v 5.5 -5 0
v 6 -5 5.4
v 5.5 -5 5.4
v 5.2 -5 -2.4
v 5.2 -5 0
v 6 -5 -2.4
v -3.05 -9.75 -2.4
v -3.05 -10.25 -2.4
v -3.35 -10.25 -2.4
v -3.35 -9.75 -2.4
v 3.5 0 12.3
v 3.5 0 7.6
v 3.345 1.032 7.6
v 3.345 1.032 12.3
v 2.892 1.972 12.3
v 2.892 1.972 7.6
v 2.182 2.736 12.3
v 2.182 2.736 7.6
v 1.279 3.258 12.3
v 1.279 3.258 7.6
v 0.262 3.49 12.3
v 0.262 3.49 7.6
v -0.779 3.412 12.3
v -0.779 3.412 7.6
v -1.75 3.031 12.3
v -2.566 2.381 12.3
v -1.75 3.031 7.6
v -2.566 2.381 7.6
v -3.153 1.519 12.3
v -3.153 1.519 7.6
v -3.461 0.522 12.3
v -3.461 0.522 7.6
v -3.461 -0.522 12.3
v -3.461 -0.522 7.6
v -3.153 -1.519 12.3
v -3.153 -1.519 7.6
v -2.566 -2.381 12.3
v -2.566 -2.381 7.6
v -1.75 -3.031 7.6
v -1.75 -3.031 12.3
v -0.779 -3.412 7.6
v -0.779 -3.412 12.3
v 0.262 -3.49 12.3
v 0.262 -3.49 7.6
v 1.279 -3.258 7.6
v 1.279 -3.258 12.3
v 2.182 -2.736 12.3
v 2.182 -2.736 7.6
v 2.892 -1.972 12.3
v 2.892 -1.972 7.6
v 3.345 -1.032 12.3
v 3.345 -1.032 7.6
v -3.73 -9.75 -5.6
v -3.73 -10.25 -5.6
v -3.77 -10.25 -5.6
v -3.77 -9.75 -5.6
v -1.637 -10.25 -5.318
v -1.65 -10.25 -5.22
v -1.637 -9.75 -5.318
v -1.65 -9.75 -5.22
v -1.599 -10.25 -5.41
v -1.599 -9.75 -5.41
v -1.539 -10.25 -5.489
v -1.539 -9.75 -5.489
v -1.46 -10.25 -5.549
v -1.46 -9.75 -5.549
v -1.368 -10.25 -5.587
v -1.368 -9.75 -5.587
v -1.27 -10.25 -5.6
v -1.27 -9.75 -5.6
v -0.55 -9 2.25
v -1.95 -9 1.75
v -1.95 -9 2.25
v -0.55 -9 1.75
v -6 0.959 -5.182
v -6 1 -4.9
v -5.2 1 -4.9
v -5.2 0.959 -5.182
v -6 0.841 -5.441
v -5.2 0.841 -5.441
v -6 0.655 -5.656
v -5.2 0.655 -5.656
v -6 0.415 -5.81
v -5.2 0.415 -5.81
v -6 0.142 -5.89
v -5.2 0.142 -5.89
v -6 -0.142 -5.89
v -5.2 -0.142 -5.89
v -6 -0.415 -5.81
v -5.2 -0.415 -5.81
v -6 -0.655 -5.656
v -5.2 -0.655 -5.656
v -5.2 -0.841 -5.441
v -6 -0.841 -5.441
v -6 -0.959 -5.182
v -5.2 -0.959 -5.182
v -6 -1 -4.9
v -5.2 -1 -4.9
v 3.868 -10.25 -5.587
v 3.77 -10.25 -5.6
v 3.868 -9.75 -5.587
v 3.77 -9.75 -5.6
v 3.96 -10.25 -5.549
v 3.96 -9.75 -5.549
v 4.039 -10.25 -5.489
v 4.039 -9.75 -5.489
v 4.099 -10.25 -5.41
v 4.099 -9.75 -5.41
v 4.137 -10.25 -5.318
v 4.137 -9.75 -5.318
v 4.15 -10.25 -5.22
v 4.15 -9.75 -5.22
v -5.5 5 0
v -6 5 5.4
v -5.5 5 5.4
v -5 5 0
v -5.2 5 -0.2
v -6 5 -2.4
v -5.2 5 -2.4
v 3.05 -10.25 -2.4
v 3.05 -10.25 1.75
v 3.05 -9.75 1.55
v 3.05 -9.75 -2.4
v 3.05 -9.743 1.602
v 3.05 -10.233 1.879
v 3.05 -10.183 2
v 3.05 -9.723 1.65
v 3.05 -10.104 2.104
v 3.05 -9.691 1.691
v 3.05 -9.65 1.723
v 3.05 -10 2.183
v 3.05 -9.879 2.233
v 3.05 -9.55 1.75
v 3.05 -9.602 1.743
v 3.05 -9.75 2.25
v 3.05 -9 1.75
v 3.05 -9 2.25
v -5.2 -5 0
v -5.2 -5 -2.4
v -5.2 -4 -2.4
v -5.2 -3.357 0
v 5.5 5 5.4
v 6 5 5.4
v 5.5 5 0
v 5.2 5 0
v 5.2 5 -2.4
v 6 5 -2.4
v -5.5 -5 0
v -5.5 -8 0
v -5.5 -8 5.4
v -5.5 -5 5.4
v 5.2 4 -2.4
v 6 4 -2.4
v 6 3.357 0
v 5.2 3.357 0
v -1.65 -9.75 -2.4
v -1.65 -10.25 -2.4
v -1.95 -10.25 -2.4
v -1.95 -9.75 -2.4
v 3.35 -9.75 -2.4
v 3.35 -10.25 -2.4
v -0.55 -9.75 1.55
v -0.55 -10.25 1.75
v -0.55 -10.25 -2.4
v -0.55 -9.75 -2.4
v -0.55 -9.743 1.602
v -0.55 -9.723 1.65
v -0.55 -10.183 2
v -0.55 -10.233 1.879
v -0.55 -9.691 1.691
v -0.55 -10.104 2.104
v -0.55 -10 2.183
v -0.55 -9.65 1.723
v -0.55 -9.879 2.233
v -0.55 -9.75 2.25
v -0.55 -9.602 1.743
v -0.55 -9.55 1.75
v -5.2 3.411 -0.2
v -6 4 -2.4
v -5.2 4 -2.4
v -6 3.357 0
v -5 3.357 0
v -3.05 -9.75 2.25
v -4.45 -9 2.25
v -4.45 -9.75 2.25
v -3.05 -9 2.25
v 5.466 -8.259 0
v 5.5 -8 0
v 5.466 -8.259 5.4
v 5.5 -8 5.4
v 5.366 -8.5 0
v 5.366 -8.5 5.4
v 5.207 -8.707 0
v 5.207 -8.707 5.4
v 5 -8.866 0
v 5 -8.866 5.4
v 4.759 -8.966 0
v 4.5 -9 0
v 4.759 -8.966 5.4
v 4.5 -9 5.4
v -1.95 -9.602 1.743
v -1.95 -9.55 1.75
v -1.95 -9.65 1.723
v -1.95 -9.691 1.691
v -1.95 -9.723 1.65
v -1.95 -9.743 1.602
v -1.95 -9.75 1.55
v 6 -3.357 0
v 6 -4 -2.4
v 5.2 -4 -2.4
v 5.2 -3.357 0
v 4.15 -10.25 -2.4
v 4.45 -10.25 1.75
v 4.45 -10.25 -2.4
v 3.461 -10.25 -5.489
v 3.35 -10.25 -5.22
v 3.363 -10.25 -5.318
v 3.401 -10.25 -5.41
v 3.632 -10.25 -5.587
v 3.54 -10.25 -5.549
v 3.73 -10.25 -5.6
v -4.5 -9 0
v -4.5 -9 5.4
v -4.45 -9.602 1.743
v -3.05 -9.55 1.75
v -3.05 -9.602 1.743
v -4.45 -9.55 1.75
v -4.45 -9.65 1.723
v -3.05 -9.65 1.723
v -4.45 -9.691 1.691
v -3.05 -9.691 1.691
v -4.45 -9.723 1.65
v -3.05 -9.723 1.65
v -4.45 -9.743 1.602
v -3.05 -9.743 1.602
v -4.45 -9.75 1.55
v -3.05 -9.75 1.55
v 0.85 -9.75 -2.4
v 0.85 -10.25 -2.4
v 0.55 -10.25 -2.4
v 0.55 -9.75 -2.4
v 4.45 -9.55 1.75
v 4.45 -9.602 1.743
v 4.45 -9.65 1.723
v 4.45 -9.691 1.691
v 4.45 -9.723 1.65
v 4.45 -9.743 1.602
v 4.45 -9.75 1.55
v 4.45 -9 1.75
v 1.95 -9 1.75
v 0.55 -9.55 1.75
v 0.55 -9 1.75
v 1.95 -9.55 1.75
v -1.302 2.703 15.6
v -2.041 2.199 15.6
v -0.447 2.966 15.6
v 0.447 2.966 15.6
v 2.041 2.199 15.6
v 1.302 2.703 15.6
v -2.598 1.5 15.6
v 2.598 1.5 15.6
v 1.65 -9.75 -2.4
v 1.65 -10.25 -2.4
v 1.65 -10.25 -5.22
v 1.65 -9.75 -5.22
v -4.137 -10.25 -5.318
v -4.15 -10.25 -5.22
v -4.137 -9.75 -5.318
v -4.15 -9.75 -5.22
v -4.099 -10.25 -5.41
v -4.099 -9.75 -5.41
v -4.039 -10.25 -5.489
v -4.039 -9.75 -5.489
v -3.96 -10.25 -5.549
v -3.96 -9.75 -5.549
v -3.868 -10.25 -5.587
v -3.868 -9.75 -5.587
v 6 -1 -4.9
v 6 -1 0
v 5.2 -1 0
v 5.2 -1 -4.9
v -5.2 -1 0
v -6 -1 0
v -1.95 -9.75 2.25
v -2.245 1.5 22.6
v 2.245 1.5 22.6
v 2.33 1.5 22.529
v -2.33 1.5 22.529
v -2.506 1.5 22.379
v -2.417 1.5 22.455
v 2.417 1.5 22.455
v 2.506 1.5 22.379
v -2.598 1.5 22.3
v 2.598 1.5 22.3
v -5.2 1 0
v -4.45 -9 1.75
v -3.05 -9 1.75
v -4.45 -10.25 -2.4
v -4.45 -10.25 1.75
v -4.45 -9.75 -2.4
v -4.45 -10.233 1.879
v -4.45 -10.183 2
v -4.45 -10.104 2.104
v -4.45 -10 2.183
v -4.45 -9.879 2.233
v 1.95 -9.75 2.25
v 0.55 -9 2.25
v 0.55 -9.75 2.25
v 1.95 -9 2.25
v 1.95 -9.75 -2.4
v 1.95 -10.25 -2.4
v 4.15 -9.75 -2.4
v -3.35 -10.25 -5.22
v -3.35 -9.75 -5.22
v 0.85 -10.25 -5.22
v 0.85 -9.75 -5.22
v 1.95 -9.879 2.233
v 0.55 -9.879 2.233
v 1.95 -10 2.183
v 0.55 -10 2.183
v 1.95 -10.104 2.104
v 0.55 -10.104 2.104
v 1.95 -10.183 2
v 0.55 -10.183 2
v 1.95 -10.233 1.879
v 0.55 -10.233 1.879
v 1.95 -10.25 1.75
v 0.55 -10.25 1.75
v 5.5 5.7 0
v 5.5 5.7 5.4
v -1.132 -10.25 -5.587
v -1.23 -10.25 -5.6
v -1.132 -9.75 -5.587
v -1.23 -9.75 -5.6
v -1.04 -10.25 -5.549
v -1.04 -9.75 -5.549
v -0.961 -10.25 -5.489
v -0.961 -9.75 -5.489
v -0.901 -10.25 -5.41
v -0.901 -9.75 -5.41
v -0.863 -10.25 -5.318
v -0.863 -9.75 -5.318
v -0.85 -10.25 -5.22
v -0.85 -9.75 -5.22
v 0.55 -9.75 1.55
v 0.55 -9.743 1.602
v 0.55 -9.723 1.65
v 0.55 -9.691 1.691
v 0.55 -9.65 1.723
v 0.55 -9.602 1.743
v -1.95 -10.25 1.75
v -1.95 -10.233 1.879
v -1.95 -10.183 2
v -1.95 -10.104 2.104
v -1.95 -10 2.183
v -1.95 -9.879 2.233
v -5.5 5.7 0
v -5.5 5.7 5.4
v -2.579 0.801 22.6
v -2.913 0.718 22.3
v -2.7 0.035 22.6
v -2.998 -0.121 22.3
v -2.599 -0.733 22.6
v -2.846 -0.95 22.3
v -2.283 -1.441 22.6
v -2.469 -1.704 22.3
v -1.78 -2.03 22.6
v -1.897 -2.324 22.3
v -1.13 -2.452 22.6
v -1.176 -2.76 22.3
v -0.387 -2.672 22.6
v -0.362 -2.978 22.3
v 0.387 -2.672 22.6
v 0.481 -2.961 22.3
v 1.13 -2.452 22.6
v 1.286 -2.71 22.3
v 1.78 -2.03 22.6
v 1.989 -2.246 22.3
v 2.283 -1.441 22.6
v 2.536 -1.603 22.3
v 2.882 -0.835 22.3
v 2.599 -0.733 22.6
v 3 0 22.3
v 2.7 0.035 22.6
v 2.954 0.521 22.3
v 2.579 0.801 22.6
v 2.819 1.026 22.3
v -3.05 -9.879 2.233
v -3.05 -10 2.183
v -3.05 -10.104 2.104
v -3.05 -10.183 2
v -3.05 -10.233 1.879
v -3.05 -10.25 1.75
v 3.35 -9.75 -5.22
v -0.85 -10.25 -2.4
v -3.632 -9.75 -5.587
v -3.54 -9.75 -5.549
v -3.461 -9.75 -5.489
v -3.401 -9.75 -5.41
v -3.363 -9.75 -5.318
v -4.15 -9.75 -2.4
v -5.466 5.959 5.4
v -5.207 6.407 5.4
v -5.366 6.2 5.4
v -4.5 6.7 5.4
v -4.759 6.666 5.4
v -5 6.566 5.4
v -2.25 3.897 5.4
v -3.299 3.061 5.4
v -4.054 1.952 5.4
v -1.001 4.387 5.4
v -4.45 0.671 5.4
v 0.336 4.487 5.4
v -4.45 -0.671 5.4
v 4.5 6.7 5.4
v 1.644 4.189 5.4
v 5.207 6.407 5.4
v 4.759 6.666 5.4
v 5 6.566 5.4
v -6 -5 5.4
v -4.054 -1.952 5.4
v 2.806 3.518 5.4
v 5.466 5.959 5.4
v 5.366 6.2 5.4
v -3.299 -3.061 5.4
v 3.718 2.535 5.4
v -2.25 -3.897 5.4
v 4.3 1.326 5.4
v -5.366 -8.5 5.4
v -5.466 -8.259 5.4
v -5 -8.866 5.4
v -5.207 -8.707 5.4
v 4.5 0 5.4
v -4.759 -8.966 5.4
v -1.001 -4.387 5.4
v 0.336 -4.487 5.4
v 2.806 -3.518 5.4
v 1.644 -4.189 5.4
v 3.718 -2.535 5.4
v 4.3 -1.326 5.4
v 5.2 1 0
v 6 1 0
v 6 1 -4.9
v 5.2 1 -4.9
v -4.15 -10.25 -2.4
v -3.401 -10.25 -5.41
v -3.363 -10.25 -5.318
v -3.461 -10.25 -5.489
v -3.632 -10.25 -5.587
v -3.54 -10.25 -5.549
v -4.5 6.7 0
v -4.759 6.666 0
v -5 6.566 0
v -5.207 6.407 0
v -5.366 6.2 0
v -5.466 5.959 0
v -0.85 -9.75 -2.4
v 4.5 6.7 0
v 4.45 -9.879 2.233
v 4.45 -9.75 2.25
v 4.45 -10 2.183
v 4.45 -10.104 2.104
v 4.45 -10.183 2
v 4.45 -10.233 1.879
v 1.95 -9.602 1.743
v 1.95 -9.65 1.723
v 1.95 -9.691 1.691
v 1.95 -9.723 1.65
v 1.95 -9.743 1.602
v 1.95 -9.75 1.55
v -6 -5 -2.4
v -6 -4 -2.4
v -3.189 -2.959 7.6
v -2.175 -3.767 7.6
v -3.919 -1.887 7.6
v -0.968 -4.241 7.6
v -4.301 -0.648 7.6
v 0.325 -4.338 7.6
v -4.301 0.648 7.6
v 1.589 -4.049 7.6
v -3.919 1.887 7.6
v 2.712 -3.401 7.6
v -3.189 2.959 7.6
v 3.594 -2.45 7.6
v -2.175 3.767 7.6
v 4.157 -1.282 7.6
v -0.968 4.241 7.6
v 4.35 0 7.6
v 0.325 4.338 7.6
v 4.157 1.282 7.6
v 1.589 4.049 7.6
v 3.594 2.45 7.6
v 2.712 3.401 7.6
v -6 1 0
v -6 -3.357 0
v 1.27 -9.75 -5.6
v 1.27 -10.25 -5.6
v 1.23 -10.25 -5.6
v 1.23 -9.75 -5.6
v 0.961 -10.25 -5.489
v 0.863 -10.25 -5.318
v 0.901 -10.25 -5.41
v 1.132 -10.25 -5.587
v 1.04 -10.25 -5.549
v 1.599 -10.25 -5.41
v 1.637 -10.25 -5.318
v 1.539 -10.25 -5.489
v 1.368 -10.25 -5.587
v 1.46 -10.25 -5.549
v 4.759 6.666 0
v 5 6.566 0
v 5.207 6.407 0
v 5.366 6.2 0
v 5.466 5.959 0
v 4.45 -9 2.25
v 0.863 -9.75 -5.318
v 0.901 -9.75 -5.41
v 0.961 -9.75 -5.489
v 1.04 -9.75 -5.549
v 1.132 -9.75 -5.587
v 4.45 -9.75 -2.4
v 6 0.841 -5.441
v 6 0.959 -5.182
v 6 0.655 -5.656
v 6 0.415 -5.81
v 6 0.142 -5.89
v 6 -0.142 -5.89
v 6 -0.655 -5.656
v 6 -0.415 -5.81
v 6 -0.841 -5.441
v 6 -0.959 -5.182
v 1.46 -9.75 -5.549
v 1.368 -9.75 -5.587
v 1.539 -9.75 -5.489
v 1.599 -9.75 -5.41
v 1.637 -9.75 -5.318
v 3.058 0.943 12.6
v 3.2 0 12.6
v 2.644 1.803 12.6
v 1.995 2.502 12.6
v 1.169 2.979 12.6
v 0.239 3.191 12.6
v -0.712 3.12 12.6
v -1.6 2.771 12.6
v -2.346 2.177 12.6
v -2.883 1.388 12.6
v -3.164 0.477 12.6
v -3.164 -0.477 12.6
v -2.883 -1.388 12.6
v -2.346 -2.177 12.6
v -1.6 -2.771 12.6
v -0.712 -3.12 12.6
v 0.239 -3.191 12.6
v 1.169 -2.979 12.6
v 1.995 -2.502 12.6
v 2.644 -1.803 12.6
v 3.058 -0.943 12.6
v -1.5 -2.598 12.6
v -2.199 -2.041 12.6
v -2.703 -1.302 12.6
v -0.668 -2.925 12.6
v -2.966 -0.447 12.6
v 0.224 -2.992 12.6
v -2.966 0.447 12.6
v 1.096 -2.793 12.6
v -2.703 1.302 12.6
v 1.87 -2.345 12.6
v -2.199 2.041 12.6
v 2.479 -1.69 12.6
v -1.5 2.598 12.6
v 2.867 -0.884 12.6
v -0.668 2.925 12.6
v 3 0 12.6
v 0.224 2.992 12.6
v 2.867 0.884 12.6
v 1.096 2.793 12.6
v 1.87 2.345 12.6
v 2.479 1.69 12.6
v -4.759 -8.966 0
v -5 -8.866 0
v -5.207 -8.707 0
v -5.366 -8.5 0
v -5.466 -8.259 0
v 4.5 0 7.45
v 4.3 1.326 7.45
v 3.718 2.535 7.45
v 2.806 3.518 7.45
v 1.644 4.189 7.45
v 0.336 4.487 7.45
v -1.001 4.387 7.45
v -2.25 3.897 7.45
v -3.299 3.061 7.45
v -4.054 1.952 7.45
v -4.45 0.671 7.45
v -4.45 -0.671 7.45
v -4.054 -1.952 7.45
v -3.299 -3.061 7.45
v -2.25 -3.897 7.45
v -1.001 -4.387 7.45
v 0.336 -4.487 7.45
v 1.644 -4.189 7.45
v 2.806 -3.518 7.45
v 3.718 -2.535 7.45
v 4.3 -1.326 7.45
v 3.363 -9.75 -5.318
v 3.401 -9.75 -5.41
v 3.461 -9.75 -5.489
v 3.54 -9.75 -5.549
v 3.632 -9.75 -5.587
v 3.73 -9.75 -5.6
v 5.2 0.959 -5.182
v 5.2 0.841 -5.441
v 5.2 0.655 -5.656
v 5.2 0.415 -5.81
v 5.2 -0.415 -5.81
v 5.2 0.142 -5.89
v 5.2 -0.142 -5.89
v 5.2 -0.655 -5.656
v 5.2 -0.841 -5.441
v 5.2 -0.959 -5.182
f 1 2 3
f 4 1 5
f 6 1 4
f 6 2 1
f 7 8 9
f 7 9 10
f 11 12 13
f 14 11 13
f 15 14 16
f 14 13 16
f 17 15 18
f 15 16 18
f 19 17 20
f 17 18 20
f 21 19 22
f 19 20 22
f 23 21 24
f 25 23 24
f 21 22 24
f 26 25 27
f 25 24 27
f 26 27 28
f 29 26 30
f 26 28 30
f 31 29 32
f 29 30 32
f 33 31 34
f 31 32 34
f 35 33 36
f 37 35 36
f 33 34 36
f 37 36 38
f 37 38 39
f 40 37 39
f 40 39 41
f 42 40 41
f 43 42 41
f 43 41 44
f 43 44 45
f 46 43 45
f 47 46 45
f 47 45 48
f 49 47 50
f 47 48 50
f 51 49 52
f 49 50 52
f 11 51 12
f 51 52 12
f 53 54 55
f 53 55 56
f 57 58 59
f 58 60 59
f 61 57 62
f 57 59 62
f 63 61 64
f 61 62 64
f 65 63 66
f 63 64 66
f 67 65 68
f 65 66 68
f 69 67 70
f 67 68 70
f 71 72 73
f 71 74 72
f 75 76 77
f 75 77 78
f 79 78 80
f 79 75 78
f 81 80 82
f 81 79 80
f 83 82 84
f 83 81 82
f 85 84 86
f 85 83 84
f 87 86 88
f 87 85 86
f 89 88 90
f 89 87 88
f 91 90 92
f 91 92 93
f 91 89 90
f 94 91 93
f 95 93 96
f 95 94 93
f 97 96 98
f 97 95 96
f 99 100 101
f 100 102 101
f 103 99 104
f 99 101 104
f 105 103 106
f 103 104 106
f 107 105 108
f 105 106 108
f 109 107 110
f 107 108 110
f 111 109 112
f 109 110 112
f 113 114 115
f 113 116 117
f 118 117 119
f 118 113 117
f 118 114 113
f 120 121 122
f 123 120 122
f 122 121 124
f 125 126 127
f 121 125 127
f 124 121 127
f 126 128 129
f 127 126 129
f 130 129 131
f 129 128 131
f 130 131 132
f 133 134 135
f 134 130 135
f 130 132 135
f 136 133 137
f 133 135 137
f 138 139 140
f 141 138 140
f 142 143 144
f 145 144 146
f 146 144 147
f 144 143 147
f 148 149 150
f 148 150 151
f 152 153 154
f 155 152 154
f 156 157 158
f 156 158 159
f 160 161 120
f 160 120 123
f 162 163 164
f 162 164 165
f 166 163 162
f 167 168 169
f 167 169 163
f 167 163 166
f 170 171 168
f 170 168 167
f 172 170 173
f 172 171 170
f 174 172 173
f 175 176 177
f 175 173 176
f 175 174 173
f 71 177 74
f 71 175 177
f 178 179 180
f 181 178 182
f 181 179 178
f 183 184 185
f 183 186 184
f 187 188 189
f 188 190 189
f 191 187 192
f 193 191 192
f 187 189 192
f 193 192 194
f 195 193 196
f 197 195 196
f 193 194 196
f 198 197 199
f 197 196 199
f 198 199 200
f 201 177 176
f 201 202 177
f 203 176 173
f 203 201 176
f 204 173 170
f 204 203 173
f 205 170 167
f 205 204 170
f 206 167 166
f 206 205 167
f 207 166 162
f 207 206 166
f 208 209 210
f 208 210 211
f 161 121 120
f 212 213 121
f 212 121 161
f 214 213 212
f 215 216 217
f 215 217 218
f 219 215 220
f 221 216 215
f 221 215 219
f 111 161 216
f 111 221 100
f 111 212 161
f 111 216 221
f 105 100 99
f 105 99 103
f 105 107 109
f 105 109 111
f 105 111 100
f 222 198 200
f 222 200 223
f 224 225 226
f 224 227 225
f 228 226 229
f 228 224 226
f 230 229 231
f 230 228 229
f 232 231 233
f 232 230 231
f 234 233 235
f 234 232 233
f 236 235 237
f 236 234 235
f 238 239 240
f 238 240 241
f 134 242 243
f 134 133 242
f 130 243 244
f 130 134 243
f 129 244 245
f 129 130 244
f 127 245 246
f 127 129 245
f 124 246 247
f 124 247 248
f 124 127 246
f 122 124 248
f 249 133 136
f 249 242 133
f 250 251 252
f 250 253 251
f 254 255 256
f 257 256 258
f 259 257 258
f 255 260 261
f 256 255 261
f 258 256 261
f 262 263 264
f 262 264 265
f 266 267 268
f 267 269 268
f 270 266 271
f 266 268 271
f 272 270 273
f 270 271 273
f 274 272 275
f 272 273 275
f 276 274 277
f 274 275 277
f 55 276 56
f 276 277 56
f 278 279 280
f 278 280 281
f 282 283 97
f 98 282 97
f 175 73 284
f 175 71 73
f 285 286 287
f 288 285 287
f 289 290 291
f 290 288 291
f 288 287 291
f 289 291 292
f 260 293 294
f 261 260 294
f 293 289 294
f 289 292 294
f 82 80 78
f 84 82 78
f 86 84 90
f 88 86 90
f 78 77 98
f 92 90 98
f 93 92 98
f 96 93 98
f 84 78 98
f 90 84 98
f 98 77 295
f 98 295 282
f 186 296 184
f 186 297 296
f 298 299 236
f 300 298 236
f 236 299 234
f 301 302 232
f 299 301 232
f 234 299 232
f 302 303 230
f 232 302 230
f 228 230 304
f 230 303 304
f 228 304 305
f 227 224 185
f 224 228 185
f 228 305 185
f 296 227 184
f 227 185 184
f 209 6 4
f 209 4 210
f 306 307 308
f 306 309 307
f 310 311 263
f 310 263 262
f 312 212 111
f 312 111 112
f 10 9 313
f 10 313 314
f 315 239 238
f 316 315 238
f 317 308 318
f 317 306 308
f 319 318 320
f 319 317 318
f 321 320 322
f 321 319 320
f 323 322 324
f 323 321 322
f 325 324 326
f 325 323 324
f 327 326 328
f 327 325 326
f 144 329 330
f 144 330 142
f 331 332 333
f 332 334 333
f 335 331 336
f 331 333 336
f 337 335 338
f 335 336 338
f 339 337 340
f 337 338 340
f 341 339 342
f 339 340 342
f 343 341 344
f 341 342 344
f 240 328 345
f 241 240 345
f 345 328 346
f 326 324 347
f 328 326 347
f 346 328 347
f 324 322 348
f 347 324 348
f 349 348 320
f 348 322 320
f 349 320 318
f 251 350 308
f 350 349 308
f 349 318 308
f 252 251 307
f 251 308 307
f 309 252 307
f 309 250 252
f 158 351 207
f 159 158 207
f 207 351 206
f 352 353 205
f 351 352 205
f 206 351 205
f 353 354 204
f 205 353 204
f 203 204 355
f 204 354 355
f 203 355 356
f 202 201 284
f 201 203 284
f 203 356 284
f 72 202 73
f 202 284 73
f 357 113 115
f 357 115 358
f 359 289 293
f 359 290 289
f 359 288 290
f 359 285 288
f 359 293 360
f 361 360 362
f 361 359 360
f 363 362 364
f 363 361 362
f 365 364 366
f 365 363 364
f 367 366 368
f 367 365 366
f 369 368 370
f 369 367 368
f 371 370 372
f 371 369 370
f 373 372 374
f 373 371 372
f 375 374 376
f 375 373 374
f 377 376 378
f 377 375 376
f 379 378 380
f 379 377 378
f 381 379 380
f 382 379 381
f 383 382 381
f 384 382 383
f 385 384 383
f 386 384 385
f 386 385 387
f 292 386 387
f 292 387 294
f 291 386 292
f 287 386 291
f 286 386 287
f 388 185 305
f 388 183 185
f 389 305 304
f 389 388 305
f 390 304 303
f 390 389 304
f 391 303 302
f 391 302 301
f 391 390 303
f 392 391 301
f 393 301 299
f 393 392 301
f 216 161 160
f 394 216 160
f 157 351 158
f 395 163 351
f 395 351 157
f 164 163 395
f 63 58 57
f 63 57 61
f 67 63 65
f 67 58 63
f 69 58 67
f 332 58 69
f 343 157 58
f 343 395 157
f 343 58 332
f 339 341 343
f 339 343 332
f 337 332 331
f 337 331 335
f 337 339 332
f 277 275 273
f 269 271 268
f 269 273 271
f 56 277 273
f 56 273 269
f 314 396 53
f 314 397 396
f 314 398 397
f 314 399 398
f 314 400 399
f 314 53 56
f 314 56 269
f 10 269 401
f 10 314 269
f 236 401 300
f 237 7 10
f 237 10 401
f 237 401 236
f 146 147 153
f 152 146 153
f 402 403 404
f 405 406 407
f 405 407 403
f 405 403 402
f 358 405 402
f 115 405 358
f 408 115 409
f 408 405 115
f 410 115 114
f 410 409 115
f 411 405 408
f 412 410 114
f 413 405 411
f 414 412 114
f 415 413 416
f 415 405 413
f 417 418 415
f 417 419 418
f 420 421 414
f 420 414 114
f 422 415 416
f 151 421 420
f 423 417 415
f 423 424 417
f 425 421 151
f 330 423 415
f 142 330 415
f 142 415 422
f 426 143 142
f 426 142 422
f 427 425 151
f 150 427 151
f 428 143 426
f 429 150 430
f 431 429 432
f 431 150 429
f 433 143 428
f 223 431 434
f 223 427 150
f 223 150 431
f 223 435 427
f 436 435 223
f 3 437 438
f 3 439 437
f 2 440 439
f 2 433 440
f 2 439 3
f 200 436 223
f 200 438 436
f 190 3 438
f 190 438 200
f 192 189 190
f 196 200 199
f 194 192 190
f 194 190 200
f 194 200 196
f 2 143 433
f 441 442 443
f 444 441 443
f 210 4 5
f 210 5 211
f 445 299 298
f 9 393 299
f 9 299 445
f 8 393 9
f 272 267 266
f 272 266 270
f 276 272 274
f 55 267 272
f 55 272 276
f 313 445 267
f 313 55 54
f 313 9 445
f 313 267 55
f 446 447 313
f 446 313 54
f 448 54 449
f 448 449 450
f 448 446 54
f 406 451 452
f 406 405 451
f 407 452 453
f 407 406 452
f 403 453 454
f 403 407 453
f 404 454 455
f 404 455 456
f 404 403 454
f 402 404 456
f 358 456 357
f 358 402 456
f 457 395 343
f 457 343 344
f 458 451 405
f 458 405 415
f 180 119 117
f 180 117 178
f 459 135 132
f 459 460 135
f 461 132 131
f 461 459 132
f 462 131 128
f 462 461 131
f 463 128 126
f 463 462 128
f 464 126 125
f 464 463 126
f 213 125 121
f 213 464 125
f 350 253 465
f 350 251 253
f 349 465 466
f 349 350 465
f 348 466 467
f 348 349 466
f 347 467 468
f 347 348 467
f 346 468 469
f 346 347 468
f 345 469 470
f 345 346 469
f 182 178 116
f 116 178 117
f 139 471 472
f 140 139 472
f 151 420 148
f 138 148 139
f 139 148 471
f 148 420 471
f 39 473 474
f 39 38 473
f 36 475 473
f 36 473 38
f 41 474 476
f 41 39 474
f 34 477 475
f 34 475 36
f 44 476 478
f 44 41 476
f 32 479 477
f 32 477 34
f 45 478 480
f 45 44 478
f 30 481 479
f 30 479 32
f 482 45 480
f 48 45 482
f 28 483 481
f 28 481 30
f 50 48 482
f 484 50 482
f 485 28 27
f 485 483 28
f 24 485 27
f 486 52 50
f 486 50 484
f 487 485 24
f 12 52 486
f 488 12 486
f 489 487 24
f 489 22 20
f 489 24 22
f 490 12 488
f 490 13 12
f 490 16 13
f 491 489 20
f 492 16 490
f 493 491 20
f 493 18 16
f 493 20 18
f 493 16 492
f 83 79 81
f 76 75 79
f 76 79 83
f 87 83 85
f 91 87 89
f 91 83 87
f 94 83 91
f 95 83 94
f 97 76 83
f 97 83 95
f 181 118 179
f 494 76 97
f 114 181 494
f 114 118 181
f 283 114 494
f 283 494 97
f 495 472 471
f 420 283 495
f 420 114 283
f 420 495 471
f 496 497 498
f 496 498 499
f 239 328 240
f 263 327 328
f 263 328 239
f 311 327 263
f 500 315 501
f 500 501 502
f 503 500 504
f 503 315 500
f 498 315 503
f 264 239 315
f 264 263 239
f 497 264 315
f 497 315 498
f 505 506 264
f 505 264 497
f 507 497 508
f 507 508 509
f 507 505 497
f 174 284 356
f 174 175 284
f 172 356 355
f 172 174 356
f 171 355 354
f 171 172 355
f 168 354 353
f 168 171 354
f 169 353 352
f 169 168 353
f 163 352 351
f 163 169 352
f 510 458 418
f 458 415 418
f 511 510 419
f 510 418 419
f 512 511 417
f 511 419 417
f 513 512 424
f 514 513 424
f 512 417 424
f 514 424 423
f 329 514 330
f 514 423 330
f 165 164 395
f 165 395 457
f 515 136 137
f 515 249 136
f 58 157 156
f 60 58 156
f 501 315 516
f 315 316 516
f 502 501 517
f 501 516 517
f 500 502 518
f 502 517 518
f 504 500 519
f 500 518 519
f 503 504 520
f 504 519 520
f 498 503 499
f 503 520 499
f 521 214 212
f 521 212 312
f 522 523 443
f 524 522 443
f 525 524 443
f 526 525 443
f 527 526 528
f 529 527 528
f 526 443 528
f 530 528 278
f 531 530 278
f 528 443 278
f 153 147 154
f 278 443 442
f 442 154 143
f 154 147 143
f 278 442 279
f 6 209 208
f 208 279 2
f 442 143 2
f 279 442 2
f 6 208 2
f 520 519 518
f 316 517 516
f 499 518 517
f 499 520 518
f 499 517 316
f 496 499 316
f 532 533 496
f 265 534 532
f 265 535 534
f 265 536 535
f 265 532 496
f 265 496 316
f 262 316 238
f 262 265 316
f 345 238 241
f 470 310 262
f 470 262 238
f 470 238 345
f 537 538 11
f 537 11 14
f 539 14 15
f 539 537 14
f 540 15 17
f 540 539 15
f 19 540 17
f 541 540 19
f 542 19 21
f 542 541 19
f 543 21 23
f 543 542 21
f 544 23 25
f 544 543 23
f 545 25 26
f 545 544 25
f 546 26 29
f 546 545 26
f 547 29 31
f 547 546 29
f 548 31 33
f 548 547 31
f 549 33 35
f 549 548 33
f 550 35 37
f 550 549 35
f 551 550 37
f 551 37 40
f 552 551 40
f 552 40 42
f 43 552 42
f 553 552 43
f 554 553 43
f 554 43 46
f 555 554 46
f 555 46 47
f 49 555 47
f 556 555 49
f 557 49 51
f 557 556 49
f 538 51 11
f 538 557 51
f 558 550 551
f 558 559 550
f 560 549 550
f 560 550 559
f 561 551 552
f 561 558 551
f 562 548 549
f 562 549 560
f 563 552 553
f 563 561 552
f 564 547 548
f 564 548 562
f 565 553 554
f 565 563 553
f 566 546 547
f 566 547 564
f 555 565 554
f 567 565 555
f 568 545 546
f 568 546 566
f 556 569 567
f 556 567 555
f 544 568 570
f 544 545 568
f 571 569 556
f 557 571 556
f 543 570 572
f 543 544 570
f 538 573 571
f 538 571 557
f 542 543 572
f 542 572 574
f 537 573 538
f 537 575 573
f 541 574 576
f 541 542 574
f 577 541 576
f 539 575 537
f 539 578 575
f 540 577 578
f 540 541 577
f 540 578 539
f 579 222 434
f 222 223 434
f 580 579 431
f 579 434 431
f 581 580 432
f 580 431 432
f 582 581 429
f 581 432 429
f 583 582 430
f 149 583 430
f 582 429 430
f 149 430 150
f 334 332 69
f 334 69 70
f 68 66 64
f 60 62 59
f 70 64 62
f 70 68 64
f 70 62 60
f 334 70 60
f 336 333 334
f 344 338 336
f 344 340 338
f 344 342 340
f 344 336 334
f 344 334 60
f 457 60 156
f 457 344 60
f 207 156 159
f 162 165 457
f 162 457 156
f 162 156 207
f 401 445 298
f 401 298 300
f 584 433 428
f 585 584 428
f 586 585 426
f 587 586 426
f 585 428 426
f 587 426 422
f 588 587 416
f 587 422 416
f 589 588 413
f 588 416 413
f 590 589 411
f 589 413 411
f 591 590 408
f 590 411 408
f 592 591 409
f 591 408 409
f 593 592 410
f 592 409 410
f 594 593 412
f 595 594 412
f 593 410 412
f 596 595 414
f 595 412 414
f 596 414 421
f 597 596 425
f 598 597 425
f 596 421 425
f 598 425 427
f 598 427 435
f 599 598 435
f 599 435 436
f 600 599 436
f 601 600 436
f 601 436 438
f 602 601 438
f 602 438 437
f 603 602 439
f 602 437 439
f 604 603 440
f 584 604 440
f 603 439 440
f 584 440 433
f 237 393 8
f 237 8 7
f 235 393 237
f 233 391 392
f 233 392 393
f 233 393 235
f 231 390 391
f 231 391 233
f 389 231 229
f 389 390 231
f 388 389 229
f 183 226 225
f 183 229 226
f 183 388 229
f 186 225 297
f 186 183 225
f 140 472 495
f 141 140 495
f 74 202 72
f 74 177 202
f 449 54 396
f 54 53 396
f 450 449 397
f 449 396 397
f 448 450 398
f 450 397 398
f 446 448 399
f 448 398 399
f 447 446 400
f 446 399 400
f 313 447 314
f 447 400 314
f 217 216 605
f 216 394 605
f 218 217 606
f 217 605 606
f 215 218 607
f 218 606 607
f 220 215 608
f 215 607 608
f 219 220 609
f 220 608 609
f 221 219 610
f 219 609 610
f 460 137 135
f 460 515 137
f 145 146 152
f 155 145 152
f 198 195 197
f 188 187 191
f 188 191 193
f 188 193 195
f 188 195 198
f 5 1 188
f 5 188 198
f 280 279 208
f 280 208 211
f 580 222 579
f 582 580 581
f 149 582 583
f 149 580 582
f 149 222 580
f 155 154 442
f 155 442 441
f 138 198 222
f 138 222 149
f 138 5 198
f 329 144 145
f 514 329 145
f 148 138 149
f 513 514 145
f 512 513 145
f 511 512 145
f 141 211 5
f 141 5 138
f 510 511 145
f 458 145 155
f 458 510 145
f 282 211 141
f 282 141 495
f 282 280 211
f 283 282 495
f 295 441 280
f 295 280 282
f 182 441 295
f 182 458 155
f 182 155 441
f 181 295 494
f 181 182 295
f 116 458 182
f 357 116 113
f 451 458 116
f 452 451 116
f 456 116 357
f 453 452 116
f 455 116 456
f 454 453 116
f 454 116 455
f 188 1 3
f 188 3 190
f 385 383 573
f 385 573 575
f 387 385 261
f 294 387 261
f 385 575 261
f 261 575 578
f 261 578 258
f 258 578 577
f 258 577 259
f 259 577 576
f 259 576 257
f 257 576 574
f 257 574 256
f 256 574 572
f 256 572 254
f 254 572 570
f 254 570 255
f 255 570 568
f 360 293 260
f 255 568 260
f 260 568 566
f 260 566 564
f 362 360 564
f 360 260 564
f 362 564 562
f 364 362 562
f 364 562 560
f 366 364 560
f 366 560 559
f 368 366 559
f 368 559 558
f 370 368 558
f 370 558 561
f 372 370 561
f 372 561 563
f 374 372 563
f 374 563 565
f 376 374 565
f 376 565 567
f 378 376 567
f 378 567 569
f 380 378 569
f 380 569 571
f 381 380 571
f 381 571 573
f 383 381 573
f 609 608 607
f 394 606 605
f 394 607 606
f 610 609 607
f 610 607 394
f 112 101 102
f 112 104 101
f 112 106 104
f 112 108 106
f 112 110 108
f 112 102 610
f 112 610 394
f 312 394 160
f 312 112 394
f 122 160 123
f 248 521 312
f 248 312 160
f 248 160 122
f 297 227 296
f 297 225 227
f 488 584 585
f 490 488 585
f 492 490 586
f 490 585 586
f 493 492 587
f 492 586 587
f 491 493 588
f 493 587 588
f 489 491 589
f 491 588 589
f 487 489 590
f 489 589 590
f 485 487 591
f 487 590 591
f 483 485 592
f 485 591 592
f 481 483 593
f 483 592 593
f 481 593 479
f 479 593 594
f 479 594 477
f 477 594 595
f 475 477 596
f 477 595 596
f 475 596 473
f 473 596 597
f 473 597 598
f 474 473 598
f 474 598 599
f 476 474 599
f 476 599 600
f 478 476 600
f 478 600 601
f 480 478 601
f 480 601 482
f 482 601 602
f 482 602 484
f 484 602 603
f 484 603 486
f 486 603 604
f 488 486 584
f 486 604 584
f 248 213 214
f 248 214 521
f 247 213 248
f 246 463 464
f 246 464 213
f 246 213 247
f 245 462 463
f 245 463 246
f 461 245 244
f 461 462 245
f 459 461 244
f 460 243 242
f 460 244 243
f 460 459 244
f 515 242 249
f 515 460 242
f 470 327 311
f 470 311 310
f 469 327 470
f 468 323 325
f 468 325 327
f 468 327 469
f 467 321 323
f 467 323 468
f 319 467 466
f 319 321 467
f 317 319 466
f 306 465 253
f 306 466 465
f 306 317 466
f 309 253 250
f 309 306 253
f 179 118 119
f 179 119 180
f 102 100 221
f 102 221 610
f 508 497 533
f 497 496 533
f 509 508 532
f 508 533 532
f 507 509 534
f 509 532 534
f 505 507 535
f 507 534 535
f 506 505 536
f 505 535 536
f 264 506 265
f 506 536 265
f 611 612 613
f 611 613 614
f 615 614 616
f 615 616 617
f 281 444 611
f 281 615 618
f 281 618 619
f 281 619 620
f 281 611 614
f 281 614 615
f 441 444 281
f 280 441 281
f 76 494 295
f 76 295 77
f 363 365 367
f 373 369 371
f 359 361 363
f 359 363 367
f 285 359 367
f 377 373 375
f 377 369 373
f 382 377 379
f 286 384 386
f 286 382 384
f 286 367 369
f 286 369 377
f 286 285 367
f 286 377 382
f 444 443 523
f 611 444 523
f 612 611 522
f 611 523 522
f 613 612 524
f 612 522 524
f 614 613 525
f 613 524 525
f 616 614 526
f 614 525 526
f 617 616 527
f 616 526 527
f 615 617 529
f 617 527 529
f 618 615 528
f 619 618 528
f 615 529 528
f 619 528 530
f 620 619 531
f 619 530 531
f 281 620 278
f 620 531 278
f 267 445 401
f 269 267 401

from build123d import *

# Parameters (mm, degrees)
PAD_DEPTH       = 5.4
FILLET_R        = 1
PAD001_DEPTH    = 0.8
PAD002_DEPTH    = 0.8
SKETCH003_R     = 4.5
PAD003_DEPTH    = 2.2
SKETCH004_R     = 3.5
PAD004_DEPTH    = 5
CHAMFER_SIZE    = 0.3
CHAMFER001_SIZE = 0.15
SKETCH005_R     = 3
PAD005_DEPTH    = 10
SKETCH006_W     = 6.98
SKETCH006_H     = 7
POCKET_DEPTH    = 5
CHAMFER002_SIZE = 0.2
CHAMFER003_SIZE = 0.3
PAD006_DEPTH    = 0.7
SKETCH009_W     = 0.5
SKETCH009_H     = 3.2
PAD007_DEPTH    = 0.4
FILLET001_R     = 0.5
FILLET002_R     = 0.2
FILLET003_R     = 0.38
PAD009_DEPTH    = 0.7
SKETCH011_W     = 0.5
SKETCH011_H     = 3.2
PAD008_DEPTH    = 0.4
FILLET006_R     = 0.5
FILLET004_R     = 0.2
FILLET005_R     = 0.38
PAD010_DEPTH    = 0.7
SKETCH012_W     = 0.5
SKETCH012_H     = 3.2
PAD011_DEPTH    = 0.4
FILLET009_R     = 0.5
FILLET007_R     = 0.2
FILLET008_R     = 0.38
PAD013_DEPTH    = 0.7
SKETCH014_W     = 0.5
SKETCH014_H     = 3.2
PAD012_DEPTH    = 0.4
FILLET010_R     = 0.5
FILLET012_R     = 0.2
FILLET011_R     = 0.38


with BuildPart() as geh_use:
    # Sketch → Pad (new body)
    with BuildSketch(Plane.XY):
        Polygon((-5.5, 6.7), (5.5, 6.7), (5.5, 5), (6, 5), (6, -5), (5.5, -5), (5.5, -9), (-5.5, -9), (-5.5, -5), (-6, -5), (-6, 5), (-5.5, 5), align=None)
    extrude(amount=PAD_DEPTH)

    # Fillet
    fillet_edges = [geh_use.edges().sort_by_distance(p)[0] for p in [
        (5.5, 6.7, 2.7),
        (-5.5, 6.7, 2.7),
        (-5.5, -9, 2.7),
        (5.5, -9, 2.7),
    ]]
    fillet(fillet_edges, radius=FILLET_R)

    # Sketch001 (on Face10 of Fillet) → Pad001 (join)
    with BuildSketch(Plane(origin=(-6, 0, 0), x_dir=(0, -1, 0), z_dir=(-1, 0, 0))):
        Polygon((-5, 0), (-5, -2.4), (-4, -2.4), (-3.356922, 0), align=None)
        Polygon((5, 0), (5, -2.4), (4, -2.4), (3.356922, 0), align=None)
    pad001 = extrude(amount=-PAD001_DEPTH)

    # Sketch002 (on Face10 of Pad001) → Pad002 (join)
    with BuildSketch(Plane(origin=(-6, 0, 0), x_dir=(0, -1, 0), z_dir=(-1, 0, 0))):
        with BuildLine():
            Line((-1, 5.4), (-1, -4.900013))
            ThreePointArc((-1, -4.900013), (7e-06, -5.900004), (1, -4.9))
            Line((1, 5.4), (1, -4.9))
            Line((-1, 5.4), (1, 5.4))
        make_face()
    pad002 = extrude(amount=-PAD002_DEPTH)

    # Mirrored: Pad001, Pad002 across YZ
    add(pad001.mirror(Plane.YZ))
    add(pad002.mirror(Plane.YZ))

    # Sketch003 (on Face5 of Mirrored) → Pad003 (join)
    with BuildSketch(Plane.XY.offset(5.4)):
        Circle(SKETCH003_R)
    extrude(amount=PAD003_DEPTH)

    # Sketch004 (on Face56 of Pad003) → Pad004 (join)
    with BuildSketch(Plane.XY.offset(7.6)):
        Circle(SKETCH004_R)
    extrude(amount=PAD004_DEPTH)

    # Chamfer
    chamfer_edges = [geh_use.edges().sort_by_distance(p)[0] for p in [
        (-3.5, 0, 12.6),
    ]]
    chamfer(chamfer_edges, length=CHAMFER_SIZE)

    # Chamfer001
    chamfer001_edges = [geh_use.edges().sort_by_distance(p)[0] for p in [
        (-4.5, 0, 7.6),
    ]]
    chamfer(chamfer001_edges, length=CHAMFER001_SIZE)

    # Sketch005 (on Face7 of Chamfer001) → Pad005 (join)
    with BuildSketch(Plane.XY.offset(12.6)):
        Circle(SKETCH005_R)
    extrude(amount=PAD005_DEPTH)

    # Sketch006 (on DatumPlane) → Pocket (cut)
    with BuildSketch(Plane.XZ.offset(-1.5)):
        with Locations((0, 19.1)):
            Rectangle(SKETCH006_W, SKETCH006_H)
    extrude(amount=-POCKET_DEPTH, mode=Mode.SUBTRACT)

    # Chamfer002
    chamfer002_edges = [geh_use.edges().sort_by_distance(p)[0] for p in [
        (-5.2, 4.178461, 0),
    ]]
    chamfer(chamfer002_edges, length=CHAMFER002_SIZE)

    # Chamfer003
    chamfer003_edges = [geh_use.edges().sort_by_distance(p)[0] for p in [
        (-0.776457, -2.897777, 22.6),
    ]]
    chamfer(chamfer003_edges, length=CHAMFER003_SIZE)


with BuildPart() as beinchen3:
    # Sketch007 (on DatumPlane) → Pad006 (new body, symmetric)
    with BuildSketch(Plane.YZ.offset(1.25)):
        Polygon((-9, 2.25), (-10.25, 2.25), (-10.25, -2.4), (-9.75, -2.4), (-9.75, 1.75), (-9, 1.75), align=None)
    extrude(amount=PAD006_DEPTH, both=True)

    # Sketch009 (on DatumPlane) → Pad007 (join, symmetric)
    with BuildSketch(Plane.YZ.offset(1.25)):
        with Locations((-10, -4)):
            Rectangle(SKETCH009_W, SKETCH009_H)
    extrude(amount=PAD007_DEPTH, both=True)

    # Fillet001
    fillet001_edges = [beinchen3.edges().sort_by_distance(p)[0] for p in [
        (1.25, -10.25, 2.25),
    ]]
    fillet(fillet001_edges, radius=FILLET001_R)

    # Fillet002
    fillet002_edges = [beinchen3.edges().sort_by_distance(p)[0] for p in [
        (1.25, -9.75, 1.75),
    ]]
    fillet(fillet002_edges, radius=FILLET002_R)

    # Fillet003
    fillet003_edges = [beinchen3.edges().sort_by_distance(p)[0] for p in [
        (0.85, -10, -5.6),
        (1.65, -10, -5.6),
    ]]
    fillet(fillet003_edges, radius=FILLET003_R)


with BuildPart() as beinchen2:
    # Sketch010 (on DatumPlane) → Pad009 (new body, symmetric)
    with BuildSketch(Plane.YZ.offset(-1.25)):
        Polygon((-9, 2.25), (-10.25, 2.25), (-10.25, -2.4), (-9.75, -2.4), (-9.75, 1.75), (-9, 1.75), align=None)
    extrude(amount=PAD009_DEPTH, both=True)

    # Sketch011 (on DatumPlane) → Pad008 (join, symmetric)
    with BuildSketch(Plane.YZ.offset(-1.25)):
        with Locations((-10, -4)):
            Rectangle(SKETCH011_W, SKETCH011_H)
    extrude(amount=PAD008_DEPTH, both=True)

    # Fillet006
    fillet006_edges = [beinchen2.edges().sort_by_distance(p)[0] for p in [
        (-1.25, -10.25, 2.25),
    ]]
    fillet(fillet006_edges, radius=FILLET006_R)

    # Fillet004
    fillet004_edges = [beinchen2.edges().sort_by_distance(p)[0] for p in [
        (-1.25, -9.75, 1.75),
    ]]
    fillet(fillet004_edges, radius=FILLET004_R)

    # Fillet005
    fillet005_edges = [beinchen2.edges().sort_by_distance(p)[0] for p in [
        (-1.65, -10, -5.6),
        (-0.85, -10, -5.6),
    ]]
    fillet(fillet005_edges, radius=FILLET005_R)


with BuildPart() as beinchen1:
    # Sketch013 (on DatumPlane) → Pad010 (new body, symmetric)
    with BuildSketch(Plane.YZ.offset(-3.75)):
        Polygon((-9, 2.25), (-10.25, 2.25), (-10.25, -2.4), (-9.75, -2.4), (-9.75, 1.75), (-9, 1.75), align=None)
    extrude(amount=PAD010_DEPTH, both=True)

    # Sketch012 (on DatumPlane) → Pad011 (join, symmetric)
    with BuildSketch(Plane.YZ.offset(-3.75)):
        with Locations((-10, -4)):
            Rectangle(SKETCH012_W, SKETCH012_H)
    extrude(amount=PAD011_DEPTH, both=True)

    # Fillet009
    fillet009_edges = [beinchen1.edges().sort_by_distance(p)[0] for p in [
        (-3.75, -10.25, 2.25),
    ]]
    fillet(fillet009_edges, radius=FILLET009_R)

    # Fillet007
    fillet007_edges = [beinchen1.edges().sort_by_distance(p)[0] for p in [
        (-3.75, -9.75, 1.75),
    ]]
    fillet(fillet007_edges, radius=FILLET007_R)

    # Fillet008
    fillet008_edges = [beinchen1.edges().sort_by_distance(p)[0] for p in [
        (-4.15, -10, -5.6),
        (-3.35, -10, -5.6),
    ]]
    fillet(fillet008_edges, radius=FILLET008_R)


with BuildPart() as beinchen4:
    # Sketch015 (on DatumPlane) → Pad013 (new body, symmetric)
    with BuildSketch(Plane.YZ.offset(3.75)):
        Polygon((-9, 2.25), (-10.25, 2.25), (-10.25, -2.4), (-9.75, -2.4), (-9.75, 1.75), (-9, 1.75), align=None)
    extrude(amount=PAD013_DEPTH, both=True)

    # Sketch014 (on DatumPlane) → Pad012 (join, symmetric)
    with BuildSketch(Plane.YZ.offset(3.75)):
        with Locations((-10, -4)):
            Rectangle(SKETCH014_W, SKETCH014_H)
    extrude(amount=PAD012_DEPTH, both=True)

    # Fillet010
    fillet010_edges = [beinchen4.edges().sort_by_distance(p)[0] for p in [
        (3.75, -10.25, 2.25),
    ]]
    fillet(fillet010_edges, radius=FILLET010_R)

    # Fillet012
    fillet012_edges = [beinchen4.edges().sort_by_distance(p)[0] for p in [
        (3.75, -9.75, 1.75),
    ]]
    fillet(fillet012_edges, radius=FILLET012_R)

    # Fillet011
    fillet011_edges = [beinchen4.edges().sort_by_distance(p)[0] for p in [
        (3.35, -10, -5.6),
        (4.15, -10, -5.6),
    ]]
    fillet(fillet011_edges, radius=FILLET011_R)


solid = Compound([geh_use.part, beinchen3.part, beinchen2.part, beinchen1.part, beinchen4.part])
